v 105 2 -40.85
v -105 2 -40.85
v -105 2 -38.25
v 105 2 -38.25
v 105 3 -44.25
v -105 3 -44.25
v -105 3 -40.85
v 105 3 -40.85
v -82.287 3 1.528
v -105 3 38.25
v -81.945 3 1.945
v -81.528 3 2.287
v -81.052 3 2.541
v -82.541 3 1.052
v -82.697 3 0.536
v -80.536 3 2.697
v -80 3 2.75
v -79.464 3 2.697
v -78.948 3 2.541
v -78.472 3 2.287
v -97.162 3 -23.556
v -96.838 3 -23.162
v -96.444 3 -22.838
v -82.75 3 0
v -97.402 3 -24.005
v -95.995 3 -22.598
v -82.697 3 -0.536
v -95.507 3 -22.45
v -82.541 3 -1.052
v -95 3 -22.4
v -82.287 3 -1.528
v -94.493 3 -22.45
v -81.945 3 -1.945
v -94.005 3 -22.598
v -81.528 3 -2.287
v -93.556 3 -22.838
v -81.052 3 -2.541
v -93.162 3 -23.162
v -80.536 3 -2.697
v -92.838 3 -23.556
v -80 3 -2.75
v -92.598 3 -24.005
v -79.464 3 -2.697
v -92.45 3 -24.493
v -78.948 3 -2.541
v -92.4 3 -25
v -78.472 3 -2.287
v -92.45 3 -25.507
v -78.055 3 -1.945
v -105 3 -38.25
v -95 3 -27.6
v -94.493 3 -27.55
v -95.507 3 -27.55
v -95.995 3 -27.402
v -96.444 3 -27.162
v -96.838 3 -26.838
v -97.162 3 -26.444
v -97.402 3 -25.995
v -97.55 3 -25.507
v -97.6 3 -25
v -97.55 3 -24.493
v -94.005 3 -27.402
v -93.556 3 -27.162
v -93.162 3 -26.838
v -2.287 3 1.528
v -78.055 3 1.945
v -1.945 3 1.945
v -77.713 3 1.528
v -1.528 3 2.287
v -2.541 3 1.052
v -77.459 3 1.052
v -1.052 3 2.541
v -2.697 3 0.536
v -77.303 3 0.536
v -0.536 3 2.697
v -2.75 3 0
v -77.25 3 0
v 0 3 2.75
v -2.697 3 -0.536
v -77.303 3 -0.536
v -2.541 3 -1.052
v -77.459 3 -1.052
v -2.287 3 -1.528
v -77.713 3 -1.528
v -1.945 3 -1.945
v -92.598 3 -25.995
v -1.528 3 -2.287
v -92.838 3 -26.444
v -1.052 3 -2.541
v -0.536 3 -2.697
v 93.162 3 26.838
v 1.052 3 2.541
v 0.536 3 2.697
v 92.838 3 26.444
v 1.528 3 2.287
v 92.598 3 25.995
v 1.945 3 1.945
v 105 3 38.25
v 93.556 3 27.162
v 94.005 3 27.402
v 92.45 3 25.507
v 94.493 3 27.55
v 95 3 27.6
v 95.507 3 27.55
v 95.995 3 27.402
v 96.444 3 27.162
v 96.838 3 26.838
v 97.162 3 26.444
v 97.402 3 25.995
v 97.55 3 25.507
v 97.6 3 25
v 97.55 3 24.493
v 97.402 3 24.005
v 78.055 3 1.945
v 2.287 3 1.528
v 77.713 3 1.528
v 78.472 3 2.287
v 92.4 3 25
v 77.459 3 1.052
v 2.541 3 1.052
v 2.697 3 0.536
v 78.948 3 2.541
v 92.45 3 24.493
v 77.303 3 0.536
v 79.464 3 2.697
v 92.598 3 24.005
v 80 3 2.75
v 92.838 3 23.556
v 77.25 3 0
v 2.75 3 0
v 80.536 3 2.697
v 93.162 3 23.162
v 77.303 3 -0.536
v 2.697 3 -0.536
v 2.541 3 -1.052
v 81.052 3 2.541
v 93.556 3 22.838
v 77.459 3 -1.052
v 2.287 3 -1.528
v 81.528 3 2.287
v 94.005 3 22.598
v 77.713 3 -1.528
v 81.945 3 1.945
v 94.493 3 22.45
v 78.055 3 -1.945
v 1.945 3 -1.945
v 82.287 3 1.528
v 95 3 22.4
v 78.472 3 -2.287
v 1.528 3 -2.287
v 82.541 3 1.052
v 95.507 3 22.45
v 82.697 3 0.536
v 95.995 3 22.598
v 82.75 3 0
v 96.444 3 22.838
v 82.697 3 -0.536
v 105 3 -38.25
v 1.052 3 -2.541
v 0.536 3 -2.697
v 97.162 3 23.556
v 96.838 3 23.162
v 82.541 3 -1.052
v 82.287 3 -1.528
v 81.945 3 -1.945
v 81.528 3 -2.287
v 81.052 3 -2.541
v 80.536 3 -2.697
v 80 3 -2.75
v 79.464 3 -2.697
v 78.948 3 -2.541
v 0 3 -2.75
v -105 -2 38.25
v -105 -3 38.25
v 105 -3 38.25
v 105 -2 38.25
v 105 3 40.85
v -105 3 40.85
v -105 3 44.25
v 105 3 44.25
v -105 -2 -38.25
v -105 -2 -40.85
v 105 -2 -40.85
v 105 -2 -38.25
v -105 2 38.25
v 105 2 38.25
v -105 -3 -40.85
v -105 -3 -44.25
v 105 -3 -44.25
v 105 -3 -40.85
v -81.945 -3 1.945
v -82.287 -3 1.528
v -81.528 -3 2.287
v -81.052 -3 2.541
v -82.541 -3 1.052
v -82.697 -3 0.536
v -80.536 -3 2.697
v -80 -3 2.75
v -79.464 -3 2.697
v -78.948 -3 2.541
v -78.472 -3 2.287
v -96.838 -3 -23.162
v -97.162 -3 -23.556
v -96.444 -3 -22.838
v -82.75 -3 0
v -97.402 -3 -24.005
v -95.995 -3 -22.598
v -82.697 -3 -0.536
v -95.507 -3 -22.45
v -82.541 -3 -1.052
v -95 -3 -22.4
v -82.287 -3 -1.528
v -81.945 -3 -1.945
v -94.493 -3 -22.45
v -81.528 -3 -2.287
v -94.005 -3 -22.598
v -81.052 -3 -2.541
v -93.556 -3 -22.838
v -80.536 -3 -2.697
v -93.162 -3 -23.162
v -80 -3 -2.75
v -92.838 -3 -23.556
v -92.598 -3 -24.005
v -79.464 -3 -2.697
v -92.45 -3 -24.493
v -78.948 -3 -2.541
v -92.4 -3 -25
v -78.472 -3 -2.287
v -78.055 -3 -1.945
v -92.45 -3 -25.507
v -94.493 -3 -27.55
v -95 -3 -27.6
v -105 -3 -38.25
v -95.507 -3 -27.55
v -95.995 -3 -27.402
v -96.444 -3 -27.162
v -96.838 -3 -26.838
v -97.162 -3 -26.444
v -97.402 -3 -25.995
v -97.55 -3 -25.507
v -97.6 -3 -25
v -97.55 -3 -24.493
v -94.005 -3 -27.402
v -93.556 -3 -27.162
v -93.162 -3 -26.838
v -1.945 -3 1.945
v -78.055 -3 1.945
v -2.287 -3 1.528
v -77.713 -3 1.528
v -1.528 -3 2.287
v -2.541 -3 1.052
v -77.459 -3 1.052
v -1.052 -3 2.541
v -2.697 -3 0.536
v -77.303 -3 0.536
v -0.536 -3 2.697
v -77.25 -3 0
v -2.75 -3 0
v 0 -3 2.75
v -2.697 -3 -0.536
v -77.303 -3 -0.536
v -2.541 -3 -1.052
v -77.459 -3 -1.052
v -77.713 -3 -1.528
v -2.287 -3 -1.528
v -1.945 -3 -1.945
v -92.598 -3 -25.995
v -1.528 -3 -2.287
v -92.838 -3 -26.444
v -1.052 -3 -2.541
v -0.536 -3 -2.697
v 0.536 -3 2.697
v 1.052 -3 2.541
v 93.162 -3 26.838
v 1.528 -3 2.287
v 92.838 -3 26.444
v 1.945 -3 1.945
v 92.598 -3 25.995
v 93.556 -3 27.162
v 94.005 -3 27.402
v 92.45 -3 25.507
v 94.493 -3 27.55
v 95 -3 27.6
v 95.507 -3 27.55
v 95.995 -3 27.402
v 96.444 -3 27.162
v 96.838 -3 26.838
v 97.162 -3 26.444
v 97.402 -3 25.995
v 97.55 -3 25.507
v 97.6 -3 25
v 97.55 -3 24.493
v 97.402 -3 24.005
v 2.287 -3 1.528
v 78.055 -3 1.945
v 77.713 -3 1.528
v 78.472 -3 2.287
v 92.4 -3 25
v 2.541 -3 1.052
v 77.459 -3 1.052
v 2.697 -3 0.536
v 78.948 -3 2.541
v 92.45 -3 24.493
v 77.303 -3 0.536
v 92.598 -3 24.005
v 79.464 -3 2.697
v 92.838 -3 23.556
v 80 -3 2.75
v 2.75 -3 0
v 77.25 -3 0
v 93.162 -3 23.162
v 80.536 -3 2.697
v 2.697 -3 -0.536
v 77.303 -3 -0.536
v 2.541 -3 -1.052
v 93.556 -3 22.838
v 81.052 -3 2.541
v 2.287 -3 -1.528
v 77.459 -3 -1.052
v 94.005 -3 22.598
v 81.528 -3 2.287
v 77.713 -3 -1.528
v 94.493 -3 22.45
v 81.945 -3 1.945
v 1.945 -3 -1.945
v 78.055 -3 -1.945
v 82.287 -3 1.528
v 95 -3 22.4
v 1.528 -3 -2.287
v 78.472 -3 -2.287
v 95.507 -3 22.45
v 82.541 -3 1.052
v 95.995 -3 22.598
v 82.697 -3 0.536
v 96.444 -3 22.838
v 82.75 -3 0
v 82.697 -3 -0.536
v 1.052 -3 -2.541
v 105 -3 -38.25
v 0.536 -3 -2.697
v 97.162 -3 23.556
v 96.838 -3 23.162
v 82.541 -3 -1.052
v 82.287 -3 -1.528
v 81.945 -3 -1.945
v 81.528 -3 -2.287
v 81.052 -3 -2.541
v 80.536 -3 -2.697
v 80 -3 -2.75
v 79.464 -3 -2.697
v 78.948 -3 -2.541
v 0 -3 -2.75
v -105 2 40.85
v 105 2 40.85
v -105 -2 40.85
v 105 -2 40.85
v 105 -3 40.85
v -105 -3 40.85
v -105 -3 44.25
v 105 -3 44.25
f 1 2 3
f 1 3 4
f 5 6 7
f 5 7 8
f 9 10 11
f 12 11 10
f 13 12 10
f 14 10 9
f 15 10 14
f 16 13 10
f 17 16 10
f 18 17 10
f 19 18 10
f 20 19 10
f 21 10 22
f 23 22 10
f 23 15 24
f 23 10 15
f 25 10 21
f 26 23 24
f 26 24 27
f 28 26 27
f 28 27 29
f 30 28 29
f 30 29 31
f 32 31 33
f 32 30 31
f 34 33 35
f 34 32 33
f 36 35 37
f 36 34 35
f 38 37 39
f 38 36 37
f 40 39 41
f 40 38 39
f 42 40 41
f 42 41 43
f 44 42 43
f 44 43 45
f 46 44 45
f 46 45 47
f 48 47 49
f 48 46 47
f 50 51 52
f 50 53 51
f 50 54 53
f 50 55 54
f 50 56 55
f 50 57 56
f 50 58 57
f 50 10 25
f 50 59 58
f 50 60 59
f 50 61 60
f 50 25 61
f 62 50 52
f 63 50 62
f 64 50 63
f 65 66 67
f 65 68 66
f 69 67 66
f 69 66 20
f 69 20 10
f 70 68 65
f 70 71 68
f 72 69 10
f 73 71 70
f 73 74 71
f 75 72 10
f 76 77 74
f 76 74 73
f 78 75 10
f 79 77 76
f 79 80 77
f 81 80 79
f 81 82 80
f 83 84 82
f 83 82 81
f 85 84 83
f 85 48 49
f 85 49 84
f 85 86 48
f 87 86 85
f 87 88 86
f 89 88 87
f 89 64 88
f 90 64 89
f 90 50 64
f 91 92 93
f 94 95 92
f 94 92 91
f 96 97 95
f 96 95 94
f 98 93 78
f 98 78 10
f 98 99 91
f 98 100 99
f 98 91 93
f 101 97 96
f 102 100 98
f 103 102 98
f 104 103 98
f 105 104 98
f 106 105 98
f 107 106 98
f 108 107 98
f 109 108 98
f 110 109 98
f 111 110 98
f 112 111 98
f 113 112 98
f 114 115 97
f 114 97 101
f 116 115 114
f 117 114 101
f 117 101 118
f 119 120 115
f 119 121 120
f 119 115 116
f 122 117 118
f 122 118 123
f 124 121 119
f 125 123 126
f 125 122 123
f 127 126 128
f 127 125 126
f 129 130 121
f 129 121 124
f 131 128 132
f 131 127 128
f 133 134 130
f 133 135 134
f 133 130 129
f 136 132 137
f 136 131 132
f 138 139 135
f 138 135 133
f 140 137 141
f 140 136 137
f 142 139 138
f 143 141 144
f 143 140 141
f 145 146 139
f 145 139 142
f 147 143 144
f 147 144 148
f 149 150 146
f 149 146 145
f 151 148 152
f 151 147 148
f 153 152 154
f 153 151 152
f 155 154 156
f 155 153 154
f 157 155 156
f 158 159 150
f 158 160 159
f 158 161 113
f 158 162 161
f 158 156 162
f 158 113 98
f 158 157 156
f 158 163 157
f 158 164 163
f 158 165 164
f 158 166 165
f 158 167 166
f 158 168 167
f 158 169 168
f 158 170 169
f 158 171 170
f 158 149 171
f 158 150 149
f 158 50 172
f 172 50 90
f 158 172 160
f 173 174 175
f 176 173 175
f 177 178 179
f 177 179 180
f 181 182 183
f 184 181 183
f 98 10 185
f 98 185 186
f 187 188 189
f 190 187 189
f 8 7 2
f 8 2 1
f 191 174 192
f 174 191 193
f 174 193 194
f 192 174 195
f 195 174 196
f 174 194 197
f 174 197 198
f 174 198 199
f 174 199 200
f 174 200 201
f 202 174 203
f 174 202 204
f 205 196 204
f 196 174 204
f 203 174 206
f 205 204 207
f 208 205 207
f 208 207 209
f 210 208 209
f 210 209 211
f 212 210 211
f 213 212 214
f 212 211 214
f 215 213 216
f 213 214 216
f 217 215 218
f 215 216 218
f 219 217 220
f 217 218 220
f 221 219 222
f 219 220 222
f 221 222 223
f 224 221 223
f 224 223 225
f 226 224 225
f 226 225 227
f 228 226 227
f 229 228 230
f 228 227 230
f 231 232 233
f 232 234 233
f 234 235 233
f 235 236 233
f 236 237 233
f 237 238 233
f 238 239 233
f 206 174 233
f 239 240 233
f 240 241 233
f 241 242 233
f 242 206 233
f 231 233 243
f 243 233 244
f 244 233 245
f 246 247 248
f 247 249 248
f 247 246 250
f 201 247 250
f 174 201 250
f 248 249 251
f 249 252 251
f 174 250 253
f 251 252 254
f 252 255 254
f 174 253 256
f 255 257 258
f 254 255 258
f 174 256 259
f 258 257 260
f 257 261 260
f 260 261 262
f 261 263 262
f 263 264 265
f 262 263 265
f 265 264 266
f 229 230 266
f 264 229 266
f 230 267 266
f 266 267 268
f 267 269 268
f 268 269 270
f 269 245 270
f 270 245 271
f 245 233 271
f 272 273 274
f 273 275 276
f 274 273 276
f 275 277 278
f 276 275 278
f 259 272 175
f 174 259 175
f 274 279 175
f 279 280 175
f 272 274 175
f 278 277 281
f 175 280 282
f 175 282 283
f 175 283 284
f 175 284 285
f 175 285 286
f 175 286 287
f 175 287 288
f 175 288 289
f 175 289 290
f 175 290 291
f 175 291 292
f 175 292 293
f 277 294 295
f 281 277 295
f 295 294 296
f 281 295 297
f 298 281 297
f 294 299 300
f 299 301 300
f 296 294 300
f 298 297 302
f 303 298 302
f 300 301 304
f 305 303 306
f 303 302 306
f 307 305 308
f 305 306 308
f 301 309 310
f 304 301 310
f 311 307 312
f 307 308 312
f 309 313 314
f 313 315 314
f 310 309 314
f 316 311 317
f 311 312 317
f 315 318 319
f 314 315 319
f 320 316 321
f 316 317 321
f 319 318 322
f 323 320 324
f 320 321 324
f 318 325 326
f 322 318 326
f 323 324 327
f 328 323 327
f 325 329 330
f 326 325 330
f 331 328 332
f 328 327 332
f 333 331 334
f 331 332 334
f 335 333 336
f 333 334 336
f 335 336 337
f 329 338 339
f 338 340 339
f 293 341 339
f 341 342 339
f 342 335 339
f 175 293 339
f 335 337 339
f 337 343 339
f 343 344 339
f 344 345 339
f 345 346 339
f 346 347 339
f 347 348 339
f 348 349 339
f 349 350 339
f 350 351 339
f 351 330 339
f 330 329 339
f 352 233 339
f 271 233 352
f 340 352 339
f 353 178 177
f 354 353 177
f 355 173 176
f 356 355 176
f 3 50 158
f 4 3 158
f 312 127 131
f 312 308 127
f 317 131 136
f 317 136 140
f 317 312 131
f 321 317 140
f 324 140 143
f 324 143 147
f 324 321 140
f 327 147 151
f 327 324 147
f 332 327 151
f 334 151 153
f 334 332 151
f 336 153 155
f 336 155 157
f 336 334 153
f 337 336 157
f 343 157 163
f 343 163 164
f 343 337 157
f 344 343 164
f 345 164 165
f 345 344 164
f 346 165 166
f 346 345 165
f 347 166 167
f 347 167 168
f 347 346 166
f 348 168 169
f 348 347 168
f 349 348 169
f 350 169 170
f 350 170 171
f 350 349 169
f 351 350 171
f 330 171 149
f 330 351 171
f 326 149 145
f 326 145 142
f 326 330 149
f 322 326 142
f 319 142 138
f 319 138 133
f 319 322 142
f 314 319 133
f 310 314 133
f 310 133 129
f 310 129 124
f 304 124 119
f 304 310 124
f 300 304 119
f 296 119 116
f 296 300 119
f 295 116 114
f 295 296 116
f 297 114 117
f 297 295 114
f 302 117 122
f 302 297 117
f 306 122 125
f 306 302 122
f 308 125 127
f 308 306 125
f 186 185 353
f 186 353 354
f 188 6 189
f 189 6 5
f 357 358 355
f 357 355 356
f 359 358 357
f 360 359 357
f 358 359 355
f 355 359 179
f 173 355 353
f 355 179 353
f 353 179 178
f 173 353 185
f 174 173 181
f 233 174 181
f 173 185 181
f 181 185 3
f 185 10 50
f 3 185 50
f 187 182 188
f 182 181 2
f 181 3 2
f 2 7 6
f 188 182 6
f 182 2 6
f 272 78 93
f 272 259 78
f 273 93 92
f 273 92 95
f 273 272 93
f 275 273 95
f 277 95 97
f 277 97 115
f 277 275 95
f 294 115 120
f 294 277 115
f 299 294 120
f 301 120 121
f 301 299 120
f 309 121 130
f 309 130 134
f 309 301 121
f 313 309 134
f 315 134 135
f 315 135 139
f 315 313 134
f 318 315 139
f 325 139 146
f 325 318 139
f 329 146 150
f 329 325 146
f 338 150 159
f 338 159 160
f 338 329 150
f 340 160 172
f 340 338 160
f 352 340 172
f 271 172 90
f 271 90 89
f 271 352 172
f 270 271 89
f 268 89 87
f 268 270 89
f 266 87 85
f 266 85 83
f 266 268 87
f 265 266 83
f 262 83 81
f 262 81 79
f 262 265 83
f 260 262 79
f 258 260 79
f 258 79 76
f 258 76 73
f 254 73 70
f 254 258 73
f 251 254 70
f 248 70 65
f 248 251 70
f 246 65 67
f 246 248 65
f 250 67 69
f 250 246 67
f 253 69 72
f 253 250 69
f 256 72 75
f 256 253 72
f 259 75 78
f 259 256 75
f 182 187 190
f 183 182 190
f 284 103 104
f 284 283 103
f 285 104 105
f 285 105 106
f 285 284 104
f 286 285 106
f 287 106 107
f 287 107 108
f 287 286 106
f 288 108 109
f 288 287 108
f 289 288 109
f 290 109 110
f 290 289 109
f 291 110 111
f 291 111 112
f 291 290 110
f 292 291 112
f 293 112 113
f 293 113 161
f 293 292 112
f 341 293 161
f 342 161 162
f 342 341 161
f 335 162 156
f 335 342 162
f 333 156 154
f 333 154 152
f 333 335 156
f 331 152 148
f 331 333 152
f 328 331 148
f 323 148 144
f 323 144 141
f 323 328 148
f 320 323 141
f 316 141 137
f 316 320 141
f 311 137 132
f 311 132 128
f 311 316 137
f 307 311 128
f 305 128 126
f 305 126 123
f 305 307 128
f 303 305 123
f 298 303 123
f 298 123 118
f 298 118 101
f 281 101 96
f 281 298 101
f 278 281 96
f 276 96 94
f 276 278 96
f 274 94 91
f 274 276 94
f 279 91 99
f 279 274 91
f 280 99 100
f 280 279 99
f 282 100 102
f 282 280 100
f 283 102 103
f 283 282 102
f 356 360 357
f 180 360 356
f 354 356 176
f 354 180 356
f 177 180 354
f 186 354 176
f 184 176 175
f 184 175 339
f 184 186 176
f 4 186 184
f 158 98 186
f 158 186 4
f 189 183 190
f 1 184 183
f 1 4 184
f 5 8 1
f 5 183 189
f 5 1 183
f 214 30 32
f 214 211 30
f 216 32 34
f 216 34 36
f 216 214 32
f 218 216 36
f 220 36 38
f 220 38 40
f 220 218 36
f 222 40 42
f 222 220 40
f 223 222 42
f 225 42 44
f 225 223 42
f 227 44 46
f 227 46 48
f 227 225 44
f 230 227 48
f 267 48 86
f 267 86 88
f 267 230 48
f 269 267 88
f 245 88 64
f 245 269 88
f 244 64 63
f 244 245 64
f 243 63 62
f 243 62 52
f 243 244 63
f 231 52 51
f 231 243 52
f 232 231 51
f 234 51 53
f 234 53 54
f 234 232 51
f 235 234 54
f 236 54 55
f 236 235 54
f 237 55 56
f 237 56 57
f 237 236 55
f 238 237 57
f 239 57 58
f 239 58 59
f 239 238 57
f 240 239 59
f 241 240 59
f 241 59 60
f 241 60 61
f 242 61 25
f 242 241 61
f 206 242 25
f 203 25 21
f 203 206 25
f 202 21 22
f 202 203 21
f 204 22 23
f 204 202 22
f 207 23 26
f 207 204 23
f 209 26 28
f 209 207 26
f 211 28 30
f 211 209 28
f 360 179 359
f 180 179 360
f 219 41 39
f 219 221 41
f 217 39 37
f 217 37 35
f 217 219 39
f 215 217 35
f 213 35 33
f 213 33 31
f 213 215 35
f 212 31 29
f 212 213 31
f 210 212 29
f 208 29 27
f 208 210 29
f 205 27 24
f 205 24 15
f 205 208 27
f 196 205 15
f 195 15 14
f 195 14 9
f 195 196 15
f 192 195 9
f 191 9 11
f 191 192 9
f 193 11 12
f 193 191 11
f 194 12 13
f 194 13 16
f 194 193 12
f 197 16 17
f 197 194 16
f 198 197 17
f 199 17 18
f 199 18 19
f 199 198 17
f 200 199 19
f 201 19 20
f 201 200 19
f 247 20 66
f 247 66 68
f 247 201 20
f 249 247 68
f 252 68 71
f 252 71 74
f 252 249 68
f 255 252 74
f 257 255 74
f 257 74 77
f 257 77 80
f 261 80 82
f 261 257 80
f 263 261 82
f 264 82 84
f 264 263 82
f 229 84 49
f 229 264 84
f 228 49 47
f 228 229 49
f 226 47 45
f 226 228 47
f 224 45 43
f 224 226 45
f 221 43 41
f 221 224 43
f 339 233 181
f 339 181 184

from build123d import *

# Parameters (mm, degrees)
SKETCH1_W           = 210
SKETCH1_H           = 88.5
SKETCH1_R           = 2.75
SKETCH1_R_2         = 2.6
BOSS_EXTRUDE1_DEPTH = 3
SKETCH2_W           = 210
SKETCH2_H           = 2.6
CUT_EXTRUDE1_DEPTH  = 1


with BuildPart() as part:
    # Sketch1 → Boss-Extrude1 (new, symmetric)
    with BuildSketch(Plane(origin=(0, 0, 0), x_dir=(1, 0, 0), z_dir=(0, 1, 0))):
        Rectangle(SKETCH1_W, SKETCH1_H)
        with Locations(Location((80, 0, 0), (0, 0, 270))):
            Circle(SKETCH1_R, mode=Mode.SUBTRACT)
        with Locations(Location((0, 0, 0), (0, 0, 270))):
            Circle(SKETCH1_R, mode=Mode.SUBTRACT)
        with Locations(Location((-80, 0, 0), (0, 0, 90))):
            Circle(SKETCH1_R, mode=Mode.SUBTRACT)
        with Locations(Location((-95, 25, 0), (0, 0, 270))):
            Circle(SKETCH1_R_2, mode=Mode.SUBTRACT)
        with Locations(Location((95, -25, 0), (0, 0, 270))):
            Circle(SKETCH1_R_2, mode=Mode.SUBTRACT)
    extrude(amount=BOSS_EXTRUDE1_DEPTH, both=True)

    # Sketch2 → Cut-Extrude1 (cut)
    with BuildSketch(Plane(origin=(0, 3, 0), x_dir=(1, 0, 0), z_dir=(0, 1, 0))):
        with Locations((0, 39.55)):
            Rectangle(SKETCH2_W, SKETCH2_H)
        with Locations((0, -39.55)):
            Rectangle(SKETCH2_W, SKETCH2_H)
    cut_extrude1 = extrude(amount=-CUT_EXTRUDE1_DEPTH, mode=Mode.SUBTRACT)

    # Mirror1: Cut-Extrude1 across plane
    add(cut_extrude1.mirror(Plane.ZX), mode=Mode.SUBTRACT)


solid = part.part
